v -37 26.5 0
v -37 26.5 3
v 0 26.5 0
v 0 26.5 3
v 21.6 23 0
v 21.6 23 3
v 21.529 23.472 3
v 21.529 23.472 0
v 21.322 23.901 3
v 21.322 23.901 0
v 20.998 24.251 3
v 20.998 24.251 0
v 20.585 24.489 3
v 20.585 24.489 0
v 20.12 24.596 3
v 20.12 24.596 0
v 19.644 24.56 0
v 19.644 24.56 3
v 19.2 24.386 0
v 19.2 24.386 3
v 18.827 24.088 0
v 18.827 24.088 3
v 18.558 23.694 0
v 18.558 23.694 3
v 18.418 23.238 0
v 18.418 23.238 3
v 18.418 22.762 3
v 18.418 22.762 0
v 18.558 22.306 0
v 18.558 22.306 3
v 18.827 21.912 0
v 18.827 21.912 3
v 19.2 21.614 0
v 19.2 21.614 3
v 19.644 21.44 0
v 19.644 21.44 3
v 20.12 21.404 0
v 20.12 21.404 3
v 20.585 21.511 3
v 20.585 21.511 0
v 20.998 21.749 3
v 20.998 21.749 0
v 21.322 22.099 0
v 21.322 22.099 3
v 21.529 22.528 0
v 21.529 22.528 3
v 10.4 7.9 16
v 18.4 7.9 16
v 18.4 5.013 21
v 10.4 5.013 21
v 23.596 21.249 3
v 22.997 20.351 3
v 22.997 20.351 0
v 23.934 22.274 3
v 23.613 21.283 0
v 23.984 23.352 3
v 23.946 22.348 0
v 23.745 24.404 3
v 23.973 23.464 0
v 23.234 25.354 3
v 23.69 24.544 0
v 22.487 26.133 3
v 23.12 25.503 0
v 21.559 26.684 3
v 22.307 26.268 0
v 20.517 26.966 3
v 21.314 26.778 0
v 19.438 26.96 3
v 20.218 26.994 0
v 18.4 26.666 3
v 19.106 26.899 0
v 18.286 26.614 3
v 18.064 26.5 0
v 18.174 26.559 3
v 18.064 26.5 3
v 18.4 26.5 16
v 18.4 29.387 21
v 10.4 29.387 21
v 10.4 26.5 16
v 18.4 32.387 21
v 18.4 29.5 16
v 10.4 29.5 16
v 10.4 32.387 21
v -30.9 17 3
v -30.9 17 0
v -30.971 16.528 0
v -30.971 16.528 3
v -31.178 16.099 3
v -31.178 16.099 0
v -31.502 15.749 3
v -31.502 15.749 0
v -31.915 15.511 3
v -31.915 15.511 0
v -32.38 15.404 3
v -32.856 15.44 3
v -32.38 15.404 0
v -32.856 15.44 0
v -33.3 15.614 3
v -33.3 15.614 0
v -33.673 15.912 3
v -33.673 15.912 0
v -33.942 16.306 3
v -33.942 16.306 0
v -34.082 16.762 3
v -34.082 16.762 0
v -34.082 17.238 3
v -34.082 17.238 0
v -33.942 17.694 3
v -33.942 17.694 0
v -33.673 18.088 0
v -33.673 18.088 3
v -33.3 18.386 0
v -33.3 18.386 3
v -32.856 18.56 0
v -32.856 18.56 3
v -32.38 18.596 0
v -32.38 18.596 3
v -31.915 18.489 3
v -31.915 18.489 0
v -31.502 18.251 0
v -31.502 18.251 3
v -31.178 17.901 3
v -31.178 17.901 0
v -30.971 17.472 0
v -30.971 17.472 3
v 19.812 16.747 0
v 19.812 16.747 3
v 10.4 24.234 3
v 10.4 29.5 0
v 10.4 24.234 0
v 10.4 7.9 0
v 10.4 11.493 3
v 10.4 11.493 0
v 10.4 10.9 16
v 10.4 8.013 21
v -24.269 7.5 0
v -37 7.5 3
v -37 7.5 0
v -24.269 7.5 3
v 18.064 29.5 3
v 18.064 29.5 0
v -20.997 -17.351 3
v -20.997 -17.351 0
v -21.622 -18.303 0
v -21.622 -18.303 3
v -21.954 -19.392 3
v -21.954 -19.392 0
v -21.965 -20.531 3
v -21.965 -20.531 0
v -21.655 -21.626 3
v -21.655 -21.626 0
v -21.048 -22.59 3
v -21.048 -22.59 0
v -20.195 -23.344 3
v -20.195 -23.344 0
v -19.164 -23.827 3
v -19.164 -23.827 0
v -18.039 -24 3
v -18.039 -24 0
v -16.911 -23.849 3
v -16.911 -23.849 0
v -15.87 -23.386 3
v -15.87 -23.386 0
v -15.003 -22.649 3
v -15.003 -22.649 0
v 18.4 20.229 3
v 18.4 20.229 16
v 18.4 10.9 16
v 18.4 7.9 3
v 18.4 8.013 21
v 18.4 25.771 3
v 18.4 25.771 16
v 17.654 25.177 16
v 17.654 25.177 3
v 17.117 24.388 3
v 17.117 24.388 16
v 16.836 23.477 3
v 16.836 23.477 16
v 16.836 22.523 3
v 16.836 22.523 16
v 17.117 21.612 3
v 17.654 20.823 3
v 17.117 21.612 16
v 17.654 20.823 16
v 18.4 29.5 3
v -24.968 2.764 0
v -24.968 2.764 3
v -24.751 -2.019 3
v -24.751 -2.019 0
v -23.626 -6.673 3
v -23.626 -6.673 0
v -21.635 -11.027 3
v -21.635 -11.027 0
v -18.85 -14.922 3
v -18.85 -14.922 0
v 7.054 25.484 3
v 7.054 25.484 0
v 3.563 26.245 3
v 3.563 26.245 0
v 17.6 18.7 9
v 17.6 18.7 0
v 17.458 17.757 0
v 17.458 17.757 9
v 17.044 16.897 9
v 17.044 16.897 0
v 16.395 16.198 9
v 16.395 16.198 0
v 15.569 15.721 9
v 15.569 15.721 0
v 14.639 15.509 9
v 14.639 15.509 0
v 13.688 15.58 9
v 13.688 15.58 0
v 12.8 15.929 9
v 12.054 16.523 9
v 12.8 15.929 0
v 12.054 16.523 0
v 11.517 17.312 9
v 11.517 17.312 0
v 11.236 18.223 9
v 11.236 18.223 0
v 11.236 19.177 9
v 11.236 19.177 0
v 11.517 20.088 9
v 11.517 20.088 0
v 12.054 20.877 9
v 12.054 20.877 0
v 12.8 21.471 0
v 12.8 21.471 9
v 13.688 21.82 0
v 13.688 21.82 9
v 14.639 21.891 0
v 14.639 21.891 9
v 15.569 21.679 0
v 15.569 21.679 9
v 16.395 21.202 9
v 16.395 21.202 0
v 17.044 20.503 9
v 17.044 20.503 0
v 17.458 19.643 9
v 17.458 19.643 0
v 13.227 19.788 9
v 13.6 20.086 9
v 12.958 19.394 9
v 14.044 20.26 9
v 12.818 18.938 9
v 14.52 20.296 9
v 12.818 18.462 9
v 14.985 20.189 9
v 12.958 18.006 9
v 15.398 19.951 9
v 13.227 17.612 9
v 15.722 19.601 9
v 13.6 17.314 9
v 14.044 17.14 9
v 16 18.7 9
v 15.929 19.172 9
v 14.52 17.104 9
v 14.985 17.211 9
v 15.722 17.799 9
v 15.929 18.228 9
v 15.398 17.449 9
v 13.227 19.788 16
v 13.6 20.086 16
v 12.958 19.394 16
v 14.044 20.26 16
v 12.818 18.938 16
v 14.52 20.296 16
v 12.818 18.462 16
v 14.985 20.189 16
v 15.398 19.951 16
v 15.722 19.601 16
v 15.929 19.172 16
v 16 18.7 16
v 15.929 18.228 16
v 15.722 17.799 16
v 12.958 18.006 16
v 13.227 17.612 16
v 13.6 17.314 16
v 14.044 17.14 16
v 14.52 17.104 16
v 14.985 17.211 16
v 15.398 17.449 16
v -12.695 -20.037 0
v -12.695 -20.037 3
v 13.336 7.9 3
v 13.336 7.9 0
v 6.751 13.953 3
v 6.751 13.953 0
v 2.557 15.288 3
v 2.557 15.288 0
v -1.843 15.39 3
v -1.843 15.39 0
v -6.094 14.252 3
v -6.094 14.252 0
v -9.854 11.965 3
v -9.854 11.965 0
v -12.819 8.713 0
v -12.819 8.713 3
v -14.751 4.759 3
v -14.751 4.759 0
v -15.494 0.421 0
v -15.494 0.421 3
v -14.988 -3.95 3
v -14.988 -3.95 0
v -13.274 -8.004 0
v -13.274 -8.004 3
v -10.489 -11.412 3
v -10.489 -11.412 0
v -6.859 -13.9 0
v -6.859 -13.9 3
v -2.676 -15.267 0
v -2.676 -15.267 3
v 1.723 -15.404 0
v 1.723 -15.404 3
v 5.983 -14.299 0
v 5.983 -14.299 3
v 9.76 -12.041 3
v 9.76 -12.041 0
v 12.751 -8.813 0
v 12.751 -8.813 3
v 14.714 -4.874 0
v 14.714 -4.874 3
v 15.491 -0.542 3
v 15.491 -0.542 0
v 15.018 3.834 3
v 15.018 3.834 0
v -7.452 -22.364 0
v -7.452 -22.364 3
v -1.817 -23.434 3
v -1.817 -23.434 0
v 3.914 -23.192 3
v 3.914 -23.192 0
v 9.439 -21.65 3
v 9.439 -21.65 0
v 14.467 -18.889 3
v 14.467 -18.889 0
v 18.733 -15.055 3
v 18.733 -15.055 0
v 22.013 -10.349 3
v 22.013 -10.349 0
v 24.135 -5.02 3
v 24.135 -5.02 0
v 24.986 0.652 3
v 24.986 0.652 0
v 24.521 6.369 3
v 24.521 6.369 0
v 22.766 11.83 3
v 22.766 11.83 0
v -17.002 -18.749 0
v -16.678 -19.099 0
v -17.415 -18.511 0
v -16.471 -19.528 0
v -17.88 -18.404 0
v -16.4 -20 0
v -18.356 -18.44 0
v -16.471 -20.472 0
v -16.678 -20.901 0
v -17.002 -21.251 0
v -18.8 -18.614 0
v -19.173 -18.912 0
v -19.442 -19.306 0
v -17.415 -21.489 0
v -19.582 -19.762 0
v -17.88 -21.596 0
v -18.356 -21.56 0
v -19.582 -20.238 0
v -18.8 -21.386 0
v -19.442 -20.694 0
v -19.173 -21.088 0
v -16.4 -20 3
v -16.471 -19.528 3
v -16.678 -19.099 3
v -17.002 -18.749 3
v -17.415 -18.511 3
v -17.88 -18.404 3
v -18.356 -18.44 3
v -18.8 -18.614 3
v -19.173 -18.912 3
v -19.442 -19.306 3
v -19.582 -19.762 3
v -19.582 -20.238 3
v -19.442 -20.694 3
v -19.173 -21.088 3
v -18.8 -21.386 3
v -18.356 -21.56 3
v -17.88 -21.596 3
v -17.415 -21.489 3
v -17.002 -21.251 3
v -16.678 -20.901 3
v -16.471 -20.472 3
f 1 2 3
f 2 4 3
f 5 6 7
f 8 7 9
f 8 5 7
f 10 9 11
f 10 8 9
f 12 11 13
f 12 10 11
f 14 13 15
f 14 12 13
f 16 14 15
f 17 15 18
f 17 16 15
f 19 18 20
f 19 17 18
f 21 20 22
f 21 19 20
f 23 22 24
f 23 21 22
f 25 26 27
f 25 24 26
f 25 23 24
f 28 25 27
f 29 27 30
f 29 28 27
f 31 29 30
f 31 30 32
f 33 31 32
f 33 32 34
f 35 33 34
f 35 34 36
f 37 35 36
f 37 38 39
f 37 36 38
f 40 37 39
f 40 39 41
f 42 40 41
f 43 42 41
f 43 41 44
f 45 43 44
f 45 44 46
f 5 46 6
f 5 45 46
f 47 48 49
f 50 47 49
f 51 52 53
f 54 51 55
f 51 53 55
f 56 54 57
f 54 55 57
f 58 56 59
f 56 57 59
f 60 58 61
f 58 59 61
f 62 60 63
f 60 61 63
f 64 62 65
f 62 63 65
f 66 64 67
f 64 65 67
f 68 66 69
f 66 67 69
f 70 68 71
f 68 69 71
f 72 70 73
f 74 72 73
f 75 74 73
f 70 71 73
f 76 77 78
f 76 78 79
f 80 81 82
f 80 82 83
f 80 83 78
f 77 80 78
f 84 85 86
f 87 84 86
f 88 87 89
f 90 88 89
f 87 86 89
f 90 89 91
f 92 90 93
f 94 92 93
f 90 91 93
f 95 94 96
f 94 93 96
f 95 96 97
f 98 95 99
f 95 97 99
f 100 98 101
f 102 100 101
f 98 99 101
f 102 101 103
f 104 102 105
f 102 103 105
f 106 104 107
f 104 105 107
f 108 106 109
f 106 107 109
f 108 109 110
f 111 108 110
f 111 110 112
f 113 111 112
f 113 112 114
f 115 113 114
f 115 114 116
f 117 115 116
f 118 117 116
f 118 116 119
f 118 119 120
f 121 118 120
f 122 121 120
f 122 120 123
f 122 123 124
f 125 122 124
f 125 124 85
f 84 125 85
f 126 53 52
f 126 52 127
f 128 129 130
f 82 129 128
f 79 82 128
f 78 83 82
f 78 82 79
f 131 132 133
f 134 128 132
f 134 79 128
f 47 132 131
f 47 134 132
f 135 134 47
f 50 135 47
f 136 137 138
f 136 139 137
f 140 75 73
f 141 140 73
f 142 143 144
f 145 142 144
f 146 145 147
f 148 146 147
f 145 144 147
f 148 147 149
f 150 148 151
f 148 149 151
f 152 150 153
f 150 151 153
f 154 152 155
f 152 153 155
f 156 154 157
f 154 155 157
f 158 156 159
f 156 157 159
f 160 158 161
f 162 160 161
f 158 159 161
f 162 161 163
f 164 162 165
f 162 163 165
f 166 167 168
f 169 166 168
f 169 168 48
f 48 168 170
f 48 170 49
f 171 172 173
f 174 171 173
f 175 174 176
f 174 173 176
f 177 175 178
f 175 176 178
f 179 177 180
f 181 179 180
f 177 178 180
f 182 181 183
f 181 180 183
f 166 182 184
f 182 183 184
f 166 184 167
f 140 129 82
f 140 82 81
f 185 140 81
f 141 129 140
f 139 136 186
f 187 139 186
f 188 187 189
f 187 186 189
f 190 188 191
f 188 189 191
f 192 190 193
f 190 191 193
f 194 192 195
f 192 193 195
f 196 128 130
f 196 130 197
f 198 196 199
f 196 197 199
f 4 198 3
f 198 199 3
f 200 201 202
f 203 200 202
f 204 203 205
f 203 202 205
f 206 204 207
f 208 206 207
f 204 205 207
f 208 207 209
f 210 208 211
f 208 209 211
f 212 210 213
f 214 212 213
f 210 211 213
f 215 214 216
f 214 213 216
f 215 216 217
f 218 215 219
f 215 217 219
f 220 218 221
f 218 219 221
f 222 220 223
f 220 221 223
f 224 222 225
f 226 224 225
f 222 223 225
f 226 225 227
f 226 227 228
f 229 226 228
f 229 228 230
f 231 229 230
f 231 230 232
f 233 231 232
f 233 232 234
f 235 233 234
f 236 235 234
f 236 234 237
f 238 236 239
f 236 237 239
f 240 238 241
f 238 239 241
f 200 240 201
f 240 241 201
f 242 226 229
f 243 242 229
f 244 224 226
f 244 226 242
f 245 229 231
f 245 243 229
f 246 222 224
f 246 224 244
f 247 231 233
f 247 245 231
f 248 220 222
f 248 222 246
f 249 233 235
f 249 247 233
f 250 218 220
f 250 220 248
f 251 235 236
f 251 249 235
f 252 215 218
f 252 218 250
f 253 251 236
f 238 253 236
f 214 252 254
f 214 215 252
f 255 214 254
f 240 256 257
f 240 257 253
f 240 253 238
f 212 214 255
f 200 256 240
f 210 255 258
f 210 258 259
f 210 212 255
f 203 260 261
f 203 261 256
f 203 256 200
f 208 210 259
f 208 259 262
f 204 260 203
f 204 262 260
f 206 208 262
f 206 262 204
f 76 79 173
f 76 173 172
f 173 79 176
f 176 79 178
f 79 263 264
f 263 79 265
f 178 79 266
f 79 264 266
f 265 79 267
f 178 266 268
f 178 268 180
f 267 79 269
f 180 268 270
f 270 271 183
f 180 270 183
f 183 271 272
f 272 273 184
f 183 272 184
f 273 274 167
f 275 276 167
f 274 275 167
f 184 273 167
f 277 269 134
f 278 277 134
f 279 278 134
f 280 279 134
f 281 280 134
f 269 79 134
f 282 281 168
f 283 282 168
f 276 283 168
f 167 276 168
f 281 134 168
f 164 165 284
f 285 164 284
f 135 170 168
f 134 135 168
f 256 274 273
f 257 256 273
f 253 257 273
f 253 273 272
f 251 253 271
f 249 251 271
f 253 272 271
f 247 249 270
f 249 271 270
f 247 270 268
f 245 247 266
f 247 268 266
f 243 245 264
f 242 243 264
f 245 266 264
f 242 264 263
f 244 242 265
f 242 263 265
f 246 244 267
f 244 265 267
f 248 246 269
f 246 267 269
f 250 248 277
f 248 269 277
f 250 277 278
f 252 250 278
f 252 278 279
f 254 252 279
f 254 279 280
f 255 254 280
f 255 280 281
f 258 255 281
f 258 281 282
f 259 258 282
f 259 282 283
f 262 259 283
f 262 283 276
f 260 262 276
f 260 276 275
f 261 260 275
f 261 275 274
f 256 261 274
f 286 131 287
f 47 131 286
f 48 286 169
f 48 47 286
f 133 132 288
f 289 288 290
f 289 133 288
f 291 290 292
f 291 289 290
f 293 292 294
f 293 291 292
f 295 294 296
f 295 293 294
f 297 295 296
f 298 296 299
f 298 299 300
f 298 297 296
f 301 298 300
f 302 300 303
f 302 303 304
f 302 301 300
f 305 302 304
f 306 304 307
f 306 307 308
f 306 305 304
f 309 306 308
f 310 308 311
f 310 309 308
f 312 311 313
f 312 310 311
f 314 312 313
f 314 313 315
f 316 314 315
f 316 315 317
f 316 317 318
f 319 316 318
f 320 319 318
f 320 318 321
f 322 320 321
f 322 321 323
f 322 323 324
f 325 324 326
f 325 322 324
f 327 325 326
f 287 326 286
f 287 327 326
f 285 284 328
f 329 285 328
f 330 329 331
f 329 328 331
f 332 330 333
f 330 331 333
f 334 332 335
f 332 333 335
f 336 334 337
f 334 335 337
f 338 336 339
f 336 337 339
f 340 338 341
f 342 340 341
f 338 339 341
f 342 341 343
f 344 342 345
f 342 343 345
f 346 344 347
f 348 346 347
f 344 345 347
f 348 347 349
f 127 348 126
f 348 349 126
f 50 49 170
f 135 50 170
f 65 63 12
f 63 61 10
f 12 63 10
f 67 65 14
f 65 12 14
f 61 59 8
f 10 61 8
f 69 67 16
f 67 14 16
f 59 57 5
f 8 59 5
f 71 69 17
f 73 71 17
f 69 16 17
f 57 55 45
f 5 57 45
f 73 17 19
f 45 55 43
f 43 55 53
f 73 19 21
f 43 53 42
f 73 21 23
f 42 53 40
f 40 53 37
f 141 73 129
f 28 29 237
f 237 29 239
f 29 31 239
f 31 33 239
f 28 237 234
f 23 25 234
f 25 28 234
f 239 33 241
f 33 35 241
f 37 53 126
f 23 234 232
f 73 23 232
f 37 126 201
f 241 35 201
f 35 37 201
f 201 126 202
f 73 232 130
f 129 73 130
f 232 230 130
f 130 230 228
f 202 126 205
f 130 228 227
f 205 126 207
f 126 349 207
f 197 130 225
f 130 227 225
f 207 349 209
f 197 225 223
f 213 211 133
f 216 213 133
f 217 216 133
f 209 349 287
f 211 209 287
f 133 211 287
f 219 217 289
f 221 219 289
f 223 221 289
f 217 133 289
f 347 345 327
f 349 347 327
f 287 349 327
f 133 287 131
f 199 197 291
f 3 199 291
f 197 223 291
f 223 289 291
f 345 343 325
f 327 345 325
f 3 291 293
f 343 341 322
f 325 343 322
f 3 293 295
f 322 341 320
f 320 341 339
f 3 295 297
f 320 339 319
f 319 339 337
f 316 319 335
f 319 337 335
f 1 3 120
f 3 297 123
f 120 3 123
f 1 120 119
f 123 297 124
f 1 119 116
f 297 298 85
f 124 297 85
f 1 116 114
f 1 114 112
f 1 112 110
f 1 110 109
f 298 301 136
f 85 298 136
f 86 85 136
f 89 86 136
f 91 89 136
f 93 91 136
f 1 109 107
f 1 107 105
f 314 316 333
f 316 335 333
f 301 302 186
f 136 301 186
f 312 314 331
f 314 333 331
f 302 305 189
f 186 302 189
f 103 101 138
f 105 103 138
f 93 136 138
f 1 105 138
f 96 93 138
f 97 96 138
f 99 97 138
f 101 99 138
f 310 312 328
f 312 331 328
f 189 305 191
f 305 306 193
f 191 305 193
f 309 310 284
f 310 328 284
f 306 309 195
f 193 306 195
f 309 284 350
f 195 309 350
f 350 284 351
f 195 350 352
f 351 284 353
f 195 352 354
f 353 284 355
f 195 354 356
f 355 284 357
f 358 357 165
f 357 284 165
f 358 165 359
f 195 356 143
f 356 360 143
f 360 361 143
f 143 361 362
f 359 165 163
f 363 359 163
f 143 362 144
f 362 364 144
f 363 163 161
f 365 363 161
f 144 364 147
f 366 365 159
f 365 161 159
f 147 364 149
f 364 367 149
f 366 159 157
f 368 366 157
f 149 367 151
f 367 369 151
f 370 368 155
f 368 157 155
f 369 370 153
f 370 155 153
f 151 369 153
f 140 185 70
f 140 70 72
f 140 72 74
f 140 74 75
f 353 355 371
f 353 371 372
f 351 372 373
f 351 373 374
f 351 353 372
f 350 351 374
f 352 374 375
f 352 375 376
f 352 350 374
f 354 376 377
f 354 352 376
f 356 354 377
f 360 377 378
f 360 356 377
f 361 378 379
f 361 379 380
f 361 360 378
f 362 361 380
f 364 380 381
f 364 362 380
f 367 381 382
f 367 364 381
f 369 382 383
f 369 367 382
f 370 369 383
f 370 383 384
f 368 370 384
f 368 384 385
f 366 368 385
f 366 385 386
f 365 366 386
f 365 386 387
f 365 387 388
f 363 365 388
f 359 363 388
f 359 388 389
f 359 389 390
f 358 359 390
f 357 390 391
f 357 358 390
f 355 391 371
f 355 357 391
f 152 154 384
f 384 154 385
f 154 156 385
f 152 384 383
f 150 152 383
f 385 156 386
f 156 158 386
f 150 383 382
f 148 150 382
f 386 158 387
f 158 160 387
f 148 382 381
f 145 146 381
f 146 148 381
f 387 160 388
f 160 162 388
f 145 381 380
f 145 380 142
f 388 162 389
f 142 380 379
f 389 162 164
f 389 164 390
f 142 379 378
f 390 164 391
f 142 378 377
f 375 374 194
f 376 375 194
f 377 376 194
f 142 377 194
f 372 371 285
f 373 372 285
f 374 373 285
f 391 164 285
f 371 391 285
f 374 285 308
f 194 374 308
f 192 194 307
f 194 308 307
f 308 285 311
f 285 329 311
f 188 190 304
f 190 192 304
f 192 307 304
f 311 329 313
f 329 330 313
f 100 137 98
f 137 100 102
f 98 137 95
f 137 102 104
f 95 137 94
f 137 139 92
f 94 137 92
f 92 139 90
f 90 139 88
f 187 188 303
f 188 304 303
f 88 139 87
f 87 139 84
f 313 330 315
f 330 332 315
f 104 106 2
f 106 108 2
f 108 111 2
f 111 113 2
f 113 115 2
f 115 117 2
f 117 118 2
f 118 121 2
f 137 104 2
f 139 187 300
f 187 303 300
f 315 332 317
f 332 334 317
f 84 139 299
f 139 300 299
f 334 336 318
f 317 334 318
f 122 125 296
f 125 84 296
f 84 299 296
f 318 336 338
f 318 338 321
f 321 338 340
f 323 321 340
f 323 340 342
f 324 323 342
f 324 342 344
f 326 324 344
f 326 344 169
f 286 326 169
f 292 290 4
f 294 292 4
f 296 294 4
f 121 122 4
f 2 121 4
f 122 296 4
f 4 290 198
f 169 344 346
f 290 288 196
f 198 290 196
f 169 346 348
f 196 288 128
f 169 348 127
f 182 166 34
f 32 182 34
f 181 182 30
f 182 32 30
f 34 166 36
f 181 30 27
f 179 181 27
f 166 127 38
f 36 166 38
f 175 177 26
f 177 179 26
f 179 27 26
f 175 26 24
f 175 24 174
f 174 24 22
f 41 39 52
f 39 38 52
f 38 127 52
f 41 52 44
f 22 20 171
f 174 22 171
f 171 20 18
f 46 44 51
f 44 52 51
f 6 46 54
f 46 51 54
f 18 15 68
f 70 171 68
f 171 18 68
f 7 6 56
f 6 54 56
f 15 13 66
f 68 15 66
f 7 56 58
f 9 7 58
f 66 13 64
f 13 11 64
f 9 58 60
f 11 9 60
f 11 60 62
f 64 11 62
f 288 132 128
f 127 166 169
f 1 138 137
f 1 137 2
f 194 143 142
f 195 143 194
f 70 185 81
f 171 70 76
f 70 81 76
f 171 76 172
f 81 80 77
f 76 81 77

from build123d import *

# Parameters (mm, degrees)
SKETCH_R          = 15.5
SKETCH_R_2        = 1.6
PAD_DEPTH         = 3
PAD_FACE5_W       = 19
PAD_FACE5_H       = 3
PAD001_DEPTH      = 12
SKETCH001_W       = 8
SKETCH001_H       = 18.6
PAD002_DEPTH      = 13
PAD002_DEPTH_BACK = 3
PAD003_DEPTH      = 3
PAD004_DEPTH      = 8
SKETCH003_R       = 1.6
POCKET_DEPTH      = 16.001
SKETCH004_R       = 3.2
POCKET001_DEPTH   = 13
SKETCH005_R       = 3.2
POCKET002_DEPTH   = 9
SKETCH006_R       = 1.6
POCKET003_DEPTH   = 21.001


with BuildPart() as part:
    # Sketch → Pad (new body)
    with BuildSketch(Plane.XY):
        with BuildLine():
            Line((-25, 26.5), (-25, 7.5))
            Line((-25, 7.5), (-24.269322, 7.5))
            ThreePointArc((-24.269322, 7.5), (-24.300327, -4.373169), (-18.850224, -14.921604))
            Line((-20.997316, -17.351209), (-18.850224, -14.921604))
            ThreePointArc((-20.997316, -17.351209), (-20.648791, -22.997316), (-15.002684, -22.648791))
            Line((-15.002684, -22.648791), (-12.694657, -20.037077))
            ThreePointArc((-12.694657, -20.037077), (18.733227, -15.054945), (19.812278, 16.747086))
            Line((22.997316, 20.351209), (19.812278, 16.747086))
            ThreePointArc((22.997316, 20.351209), (22.648791, 25.997316), (17.002684, 25.648791))
            Line((17.002684, 25.648791), (13.978579, 22.226778))
            ThreePointArc((13.978579, 22.226778), (7.308575, 25.407838), (0, 26.5))
            Line((-25, 26.5), (0, 26.5))
        make_face()
        Circle(SKETCH_R, mode=Mode.SUBTRACT)
        with Locations((-18, -20)):
            Circle(SKETCH_R_2, mode=Mode.SUBTRACT)
        with Locations((20, 23)):
            Circle(SKETCH_R_2, mode=Mode.SUBTRACT)
    extrude(amount=PAD_DEPTH)

    # Pad Face5 → Pad001 (add)
    with BuildSketch(Plane(origin=(-25, 17, 1.5), x_dir=(0, 1, 0), z_dir=(-1, 0, 0))):
        Rectangle(PAD_FACE5_W, PAD_FACE5_H)
    extrude(amount=PAD001_DEPTH)

    # Sketch001 (on Face15 of Pad001) → Pad002 (join, two sides)
    with BuildSketch(Plane.XY.offset(3)) as pad002_sk:
        with Locations((14.4, 17.2)):
            Rectangle(SKETCH001_W, SKETCH001_H)
    extrude(amount=PAD002_DEPTH)
    extrude(pad002_sk.sketch, amount=-PAD002_DEPTH_BACK)

    # Pad002 Face17 → Pad003 (add)
    with BuildSketch(Plane(origin=(14.369541, 26.5, 8.05167), x_dir=(1, 0, 0), z_dir=(0, 1, 0))):
        Polygon((3.693968, 8.05167), (-3.969541, 8.05167), (-3.969541, -7.94833), (4.030459, -7.94833), (4.030459, 5.05167), (3.693968, 5.05167), align=None)
    extrude(amount=PAD003_DEPTH)

    # Sketch002 (on Face20 of Pad003) → Pad004 (join)
    with BuildSketch(Plane.YZ.offset(18.4)):
        Polygon((7.9, 16), (5.013249, 21), (8.013249, 21), (10.9, 16), align=None)
        Polygon((26.5, 16), (29.5, 16), (32.386751, 21), (29.386751, 21), align=None)
    extrude(amount=-PAD004_DEPTH)

    # Sketch003 (on Face26 of Pad004) → Pocket (cut, through all)
    with BuildSketch(Plane.XY.offset(16)):
        with Locations((14.4, 18.7)):
            Circle(SKETCH003_R)
    extrude(amount=-POCKET_DEPTH, mode=Mode.SUBTRACT)

    # Sketch004 (on Face28 of Pocket) → Pocket001 (cut)
    with BuildSketch(Plane.XY.offset(16)):
        with Locations((20, 23)):
            Circle(SKETCH004_R)
    extrude(amount=-POCKET001_DEPTH, mode=Mode.SUBTRACT)

    # Sketch005 (on Face26 of Pocket001) → Pocket002 (cut)
    with BuildSketch(Plane(origin=(0, 0, 0), x_dir=(1, 0, 0), z_dir=(0, 0, -1))):
        with Locations((14.4, -18.7)):
            Circle(SKETCH005_R)
    extrude(amount=-POCKET002_DEPTH, mode=Mode.SUBTRACT)

    # Sketch006 (on Face2 of Pocket002) → Pocket003 (cut, through all)
    with BuildSketch(Plane(origin=(0, 0, 0), x_dir=(1, 0, 0), z_dir=(0, 0, -1))):
        with Locations((-32.5, -17)):
            Circle(SKETCH006_R)
    extrude(amount=-POCKET003_DEPTH, mode=Mode.SUBTRACT)


solid = part.part
